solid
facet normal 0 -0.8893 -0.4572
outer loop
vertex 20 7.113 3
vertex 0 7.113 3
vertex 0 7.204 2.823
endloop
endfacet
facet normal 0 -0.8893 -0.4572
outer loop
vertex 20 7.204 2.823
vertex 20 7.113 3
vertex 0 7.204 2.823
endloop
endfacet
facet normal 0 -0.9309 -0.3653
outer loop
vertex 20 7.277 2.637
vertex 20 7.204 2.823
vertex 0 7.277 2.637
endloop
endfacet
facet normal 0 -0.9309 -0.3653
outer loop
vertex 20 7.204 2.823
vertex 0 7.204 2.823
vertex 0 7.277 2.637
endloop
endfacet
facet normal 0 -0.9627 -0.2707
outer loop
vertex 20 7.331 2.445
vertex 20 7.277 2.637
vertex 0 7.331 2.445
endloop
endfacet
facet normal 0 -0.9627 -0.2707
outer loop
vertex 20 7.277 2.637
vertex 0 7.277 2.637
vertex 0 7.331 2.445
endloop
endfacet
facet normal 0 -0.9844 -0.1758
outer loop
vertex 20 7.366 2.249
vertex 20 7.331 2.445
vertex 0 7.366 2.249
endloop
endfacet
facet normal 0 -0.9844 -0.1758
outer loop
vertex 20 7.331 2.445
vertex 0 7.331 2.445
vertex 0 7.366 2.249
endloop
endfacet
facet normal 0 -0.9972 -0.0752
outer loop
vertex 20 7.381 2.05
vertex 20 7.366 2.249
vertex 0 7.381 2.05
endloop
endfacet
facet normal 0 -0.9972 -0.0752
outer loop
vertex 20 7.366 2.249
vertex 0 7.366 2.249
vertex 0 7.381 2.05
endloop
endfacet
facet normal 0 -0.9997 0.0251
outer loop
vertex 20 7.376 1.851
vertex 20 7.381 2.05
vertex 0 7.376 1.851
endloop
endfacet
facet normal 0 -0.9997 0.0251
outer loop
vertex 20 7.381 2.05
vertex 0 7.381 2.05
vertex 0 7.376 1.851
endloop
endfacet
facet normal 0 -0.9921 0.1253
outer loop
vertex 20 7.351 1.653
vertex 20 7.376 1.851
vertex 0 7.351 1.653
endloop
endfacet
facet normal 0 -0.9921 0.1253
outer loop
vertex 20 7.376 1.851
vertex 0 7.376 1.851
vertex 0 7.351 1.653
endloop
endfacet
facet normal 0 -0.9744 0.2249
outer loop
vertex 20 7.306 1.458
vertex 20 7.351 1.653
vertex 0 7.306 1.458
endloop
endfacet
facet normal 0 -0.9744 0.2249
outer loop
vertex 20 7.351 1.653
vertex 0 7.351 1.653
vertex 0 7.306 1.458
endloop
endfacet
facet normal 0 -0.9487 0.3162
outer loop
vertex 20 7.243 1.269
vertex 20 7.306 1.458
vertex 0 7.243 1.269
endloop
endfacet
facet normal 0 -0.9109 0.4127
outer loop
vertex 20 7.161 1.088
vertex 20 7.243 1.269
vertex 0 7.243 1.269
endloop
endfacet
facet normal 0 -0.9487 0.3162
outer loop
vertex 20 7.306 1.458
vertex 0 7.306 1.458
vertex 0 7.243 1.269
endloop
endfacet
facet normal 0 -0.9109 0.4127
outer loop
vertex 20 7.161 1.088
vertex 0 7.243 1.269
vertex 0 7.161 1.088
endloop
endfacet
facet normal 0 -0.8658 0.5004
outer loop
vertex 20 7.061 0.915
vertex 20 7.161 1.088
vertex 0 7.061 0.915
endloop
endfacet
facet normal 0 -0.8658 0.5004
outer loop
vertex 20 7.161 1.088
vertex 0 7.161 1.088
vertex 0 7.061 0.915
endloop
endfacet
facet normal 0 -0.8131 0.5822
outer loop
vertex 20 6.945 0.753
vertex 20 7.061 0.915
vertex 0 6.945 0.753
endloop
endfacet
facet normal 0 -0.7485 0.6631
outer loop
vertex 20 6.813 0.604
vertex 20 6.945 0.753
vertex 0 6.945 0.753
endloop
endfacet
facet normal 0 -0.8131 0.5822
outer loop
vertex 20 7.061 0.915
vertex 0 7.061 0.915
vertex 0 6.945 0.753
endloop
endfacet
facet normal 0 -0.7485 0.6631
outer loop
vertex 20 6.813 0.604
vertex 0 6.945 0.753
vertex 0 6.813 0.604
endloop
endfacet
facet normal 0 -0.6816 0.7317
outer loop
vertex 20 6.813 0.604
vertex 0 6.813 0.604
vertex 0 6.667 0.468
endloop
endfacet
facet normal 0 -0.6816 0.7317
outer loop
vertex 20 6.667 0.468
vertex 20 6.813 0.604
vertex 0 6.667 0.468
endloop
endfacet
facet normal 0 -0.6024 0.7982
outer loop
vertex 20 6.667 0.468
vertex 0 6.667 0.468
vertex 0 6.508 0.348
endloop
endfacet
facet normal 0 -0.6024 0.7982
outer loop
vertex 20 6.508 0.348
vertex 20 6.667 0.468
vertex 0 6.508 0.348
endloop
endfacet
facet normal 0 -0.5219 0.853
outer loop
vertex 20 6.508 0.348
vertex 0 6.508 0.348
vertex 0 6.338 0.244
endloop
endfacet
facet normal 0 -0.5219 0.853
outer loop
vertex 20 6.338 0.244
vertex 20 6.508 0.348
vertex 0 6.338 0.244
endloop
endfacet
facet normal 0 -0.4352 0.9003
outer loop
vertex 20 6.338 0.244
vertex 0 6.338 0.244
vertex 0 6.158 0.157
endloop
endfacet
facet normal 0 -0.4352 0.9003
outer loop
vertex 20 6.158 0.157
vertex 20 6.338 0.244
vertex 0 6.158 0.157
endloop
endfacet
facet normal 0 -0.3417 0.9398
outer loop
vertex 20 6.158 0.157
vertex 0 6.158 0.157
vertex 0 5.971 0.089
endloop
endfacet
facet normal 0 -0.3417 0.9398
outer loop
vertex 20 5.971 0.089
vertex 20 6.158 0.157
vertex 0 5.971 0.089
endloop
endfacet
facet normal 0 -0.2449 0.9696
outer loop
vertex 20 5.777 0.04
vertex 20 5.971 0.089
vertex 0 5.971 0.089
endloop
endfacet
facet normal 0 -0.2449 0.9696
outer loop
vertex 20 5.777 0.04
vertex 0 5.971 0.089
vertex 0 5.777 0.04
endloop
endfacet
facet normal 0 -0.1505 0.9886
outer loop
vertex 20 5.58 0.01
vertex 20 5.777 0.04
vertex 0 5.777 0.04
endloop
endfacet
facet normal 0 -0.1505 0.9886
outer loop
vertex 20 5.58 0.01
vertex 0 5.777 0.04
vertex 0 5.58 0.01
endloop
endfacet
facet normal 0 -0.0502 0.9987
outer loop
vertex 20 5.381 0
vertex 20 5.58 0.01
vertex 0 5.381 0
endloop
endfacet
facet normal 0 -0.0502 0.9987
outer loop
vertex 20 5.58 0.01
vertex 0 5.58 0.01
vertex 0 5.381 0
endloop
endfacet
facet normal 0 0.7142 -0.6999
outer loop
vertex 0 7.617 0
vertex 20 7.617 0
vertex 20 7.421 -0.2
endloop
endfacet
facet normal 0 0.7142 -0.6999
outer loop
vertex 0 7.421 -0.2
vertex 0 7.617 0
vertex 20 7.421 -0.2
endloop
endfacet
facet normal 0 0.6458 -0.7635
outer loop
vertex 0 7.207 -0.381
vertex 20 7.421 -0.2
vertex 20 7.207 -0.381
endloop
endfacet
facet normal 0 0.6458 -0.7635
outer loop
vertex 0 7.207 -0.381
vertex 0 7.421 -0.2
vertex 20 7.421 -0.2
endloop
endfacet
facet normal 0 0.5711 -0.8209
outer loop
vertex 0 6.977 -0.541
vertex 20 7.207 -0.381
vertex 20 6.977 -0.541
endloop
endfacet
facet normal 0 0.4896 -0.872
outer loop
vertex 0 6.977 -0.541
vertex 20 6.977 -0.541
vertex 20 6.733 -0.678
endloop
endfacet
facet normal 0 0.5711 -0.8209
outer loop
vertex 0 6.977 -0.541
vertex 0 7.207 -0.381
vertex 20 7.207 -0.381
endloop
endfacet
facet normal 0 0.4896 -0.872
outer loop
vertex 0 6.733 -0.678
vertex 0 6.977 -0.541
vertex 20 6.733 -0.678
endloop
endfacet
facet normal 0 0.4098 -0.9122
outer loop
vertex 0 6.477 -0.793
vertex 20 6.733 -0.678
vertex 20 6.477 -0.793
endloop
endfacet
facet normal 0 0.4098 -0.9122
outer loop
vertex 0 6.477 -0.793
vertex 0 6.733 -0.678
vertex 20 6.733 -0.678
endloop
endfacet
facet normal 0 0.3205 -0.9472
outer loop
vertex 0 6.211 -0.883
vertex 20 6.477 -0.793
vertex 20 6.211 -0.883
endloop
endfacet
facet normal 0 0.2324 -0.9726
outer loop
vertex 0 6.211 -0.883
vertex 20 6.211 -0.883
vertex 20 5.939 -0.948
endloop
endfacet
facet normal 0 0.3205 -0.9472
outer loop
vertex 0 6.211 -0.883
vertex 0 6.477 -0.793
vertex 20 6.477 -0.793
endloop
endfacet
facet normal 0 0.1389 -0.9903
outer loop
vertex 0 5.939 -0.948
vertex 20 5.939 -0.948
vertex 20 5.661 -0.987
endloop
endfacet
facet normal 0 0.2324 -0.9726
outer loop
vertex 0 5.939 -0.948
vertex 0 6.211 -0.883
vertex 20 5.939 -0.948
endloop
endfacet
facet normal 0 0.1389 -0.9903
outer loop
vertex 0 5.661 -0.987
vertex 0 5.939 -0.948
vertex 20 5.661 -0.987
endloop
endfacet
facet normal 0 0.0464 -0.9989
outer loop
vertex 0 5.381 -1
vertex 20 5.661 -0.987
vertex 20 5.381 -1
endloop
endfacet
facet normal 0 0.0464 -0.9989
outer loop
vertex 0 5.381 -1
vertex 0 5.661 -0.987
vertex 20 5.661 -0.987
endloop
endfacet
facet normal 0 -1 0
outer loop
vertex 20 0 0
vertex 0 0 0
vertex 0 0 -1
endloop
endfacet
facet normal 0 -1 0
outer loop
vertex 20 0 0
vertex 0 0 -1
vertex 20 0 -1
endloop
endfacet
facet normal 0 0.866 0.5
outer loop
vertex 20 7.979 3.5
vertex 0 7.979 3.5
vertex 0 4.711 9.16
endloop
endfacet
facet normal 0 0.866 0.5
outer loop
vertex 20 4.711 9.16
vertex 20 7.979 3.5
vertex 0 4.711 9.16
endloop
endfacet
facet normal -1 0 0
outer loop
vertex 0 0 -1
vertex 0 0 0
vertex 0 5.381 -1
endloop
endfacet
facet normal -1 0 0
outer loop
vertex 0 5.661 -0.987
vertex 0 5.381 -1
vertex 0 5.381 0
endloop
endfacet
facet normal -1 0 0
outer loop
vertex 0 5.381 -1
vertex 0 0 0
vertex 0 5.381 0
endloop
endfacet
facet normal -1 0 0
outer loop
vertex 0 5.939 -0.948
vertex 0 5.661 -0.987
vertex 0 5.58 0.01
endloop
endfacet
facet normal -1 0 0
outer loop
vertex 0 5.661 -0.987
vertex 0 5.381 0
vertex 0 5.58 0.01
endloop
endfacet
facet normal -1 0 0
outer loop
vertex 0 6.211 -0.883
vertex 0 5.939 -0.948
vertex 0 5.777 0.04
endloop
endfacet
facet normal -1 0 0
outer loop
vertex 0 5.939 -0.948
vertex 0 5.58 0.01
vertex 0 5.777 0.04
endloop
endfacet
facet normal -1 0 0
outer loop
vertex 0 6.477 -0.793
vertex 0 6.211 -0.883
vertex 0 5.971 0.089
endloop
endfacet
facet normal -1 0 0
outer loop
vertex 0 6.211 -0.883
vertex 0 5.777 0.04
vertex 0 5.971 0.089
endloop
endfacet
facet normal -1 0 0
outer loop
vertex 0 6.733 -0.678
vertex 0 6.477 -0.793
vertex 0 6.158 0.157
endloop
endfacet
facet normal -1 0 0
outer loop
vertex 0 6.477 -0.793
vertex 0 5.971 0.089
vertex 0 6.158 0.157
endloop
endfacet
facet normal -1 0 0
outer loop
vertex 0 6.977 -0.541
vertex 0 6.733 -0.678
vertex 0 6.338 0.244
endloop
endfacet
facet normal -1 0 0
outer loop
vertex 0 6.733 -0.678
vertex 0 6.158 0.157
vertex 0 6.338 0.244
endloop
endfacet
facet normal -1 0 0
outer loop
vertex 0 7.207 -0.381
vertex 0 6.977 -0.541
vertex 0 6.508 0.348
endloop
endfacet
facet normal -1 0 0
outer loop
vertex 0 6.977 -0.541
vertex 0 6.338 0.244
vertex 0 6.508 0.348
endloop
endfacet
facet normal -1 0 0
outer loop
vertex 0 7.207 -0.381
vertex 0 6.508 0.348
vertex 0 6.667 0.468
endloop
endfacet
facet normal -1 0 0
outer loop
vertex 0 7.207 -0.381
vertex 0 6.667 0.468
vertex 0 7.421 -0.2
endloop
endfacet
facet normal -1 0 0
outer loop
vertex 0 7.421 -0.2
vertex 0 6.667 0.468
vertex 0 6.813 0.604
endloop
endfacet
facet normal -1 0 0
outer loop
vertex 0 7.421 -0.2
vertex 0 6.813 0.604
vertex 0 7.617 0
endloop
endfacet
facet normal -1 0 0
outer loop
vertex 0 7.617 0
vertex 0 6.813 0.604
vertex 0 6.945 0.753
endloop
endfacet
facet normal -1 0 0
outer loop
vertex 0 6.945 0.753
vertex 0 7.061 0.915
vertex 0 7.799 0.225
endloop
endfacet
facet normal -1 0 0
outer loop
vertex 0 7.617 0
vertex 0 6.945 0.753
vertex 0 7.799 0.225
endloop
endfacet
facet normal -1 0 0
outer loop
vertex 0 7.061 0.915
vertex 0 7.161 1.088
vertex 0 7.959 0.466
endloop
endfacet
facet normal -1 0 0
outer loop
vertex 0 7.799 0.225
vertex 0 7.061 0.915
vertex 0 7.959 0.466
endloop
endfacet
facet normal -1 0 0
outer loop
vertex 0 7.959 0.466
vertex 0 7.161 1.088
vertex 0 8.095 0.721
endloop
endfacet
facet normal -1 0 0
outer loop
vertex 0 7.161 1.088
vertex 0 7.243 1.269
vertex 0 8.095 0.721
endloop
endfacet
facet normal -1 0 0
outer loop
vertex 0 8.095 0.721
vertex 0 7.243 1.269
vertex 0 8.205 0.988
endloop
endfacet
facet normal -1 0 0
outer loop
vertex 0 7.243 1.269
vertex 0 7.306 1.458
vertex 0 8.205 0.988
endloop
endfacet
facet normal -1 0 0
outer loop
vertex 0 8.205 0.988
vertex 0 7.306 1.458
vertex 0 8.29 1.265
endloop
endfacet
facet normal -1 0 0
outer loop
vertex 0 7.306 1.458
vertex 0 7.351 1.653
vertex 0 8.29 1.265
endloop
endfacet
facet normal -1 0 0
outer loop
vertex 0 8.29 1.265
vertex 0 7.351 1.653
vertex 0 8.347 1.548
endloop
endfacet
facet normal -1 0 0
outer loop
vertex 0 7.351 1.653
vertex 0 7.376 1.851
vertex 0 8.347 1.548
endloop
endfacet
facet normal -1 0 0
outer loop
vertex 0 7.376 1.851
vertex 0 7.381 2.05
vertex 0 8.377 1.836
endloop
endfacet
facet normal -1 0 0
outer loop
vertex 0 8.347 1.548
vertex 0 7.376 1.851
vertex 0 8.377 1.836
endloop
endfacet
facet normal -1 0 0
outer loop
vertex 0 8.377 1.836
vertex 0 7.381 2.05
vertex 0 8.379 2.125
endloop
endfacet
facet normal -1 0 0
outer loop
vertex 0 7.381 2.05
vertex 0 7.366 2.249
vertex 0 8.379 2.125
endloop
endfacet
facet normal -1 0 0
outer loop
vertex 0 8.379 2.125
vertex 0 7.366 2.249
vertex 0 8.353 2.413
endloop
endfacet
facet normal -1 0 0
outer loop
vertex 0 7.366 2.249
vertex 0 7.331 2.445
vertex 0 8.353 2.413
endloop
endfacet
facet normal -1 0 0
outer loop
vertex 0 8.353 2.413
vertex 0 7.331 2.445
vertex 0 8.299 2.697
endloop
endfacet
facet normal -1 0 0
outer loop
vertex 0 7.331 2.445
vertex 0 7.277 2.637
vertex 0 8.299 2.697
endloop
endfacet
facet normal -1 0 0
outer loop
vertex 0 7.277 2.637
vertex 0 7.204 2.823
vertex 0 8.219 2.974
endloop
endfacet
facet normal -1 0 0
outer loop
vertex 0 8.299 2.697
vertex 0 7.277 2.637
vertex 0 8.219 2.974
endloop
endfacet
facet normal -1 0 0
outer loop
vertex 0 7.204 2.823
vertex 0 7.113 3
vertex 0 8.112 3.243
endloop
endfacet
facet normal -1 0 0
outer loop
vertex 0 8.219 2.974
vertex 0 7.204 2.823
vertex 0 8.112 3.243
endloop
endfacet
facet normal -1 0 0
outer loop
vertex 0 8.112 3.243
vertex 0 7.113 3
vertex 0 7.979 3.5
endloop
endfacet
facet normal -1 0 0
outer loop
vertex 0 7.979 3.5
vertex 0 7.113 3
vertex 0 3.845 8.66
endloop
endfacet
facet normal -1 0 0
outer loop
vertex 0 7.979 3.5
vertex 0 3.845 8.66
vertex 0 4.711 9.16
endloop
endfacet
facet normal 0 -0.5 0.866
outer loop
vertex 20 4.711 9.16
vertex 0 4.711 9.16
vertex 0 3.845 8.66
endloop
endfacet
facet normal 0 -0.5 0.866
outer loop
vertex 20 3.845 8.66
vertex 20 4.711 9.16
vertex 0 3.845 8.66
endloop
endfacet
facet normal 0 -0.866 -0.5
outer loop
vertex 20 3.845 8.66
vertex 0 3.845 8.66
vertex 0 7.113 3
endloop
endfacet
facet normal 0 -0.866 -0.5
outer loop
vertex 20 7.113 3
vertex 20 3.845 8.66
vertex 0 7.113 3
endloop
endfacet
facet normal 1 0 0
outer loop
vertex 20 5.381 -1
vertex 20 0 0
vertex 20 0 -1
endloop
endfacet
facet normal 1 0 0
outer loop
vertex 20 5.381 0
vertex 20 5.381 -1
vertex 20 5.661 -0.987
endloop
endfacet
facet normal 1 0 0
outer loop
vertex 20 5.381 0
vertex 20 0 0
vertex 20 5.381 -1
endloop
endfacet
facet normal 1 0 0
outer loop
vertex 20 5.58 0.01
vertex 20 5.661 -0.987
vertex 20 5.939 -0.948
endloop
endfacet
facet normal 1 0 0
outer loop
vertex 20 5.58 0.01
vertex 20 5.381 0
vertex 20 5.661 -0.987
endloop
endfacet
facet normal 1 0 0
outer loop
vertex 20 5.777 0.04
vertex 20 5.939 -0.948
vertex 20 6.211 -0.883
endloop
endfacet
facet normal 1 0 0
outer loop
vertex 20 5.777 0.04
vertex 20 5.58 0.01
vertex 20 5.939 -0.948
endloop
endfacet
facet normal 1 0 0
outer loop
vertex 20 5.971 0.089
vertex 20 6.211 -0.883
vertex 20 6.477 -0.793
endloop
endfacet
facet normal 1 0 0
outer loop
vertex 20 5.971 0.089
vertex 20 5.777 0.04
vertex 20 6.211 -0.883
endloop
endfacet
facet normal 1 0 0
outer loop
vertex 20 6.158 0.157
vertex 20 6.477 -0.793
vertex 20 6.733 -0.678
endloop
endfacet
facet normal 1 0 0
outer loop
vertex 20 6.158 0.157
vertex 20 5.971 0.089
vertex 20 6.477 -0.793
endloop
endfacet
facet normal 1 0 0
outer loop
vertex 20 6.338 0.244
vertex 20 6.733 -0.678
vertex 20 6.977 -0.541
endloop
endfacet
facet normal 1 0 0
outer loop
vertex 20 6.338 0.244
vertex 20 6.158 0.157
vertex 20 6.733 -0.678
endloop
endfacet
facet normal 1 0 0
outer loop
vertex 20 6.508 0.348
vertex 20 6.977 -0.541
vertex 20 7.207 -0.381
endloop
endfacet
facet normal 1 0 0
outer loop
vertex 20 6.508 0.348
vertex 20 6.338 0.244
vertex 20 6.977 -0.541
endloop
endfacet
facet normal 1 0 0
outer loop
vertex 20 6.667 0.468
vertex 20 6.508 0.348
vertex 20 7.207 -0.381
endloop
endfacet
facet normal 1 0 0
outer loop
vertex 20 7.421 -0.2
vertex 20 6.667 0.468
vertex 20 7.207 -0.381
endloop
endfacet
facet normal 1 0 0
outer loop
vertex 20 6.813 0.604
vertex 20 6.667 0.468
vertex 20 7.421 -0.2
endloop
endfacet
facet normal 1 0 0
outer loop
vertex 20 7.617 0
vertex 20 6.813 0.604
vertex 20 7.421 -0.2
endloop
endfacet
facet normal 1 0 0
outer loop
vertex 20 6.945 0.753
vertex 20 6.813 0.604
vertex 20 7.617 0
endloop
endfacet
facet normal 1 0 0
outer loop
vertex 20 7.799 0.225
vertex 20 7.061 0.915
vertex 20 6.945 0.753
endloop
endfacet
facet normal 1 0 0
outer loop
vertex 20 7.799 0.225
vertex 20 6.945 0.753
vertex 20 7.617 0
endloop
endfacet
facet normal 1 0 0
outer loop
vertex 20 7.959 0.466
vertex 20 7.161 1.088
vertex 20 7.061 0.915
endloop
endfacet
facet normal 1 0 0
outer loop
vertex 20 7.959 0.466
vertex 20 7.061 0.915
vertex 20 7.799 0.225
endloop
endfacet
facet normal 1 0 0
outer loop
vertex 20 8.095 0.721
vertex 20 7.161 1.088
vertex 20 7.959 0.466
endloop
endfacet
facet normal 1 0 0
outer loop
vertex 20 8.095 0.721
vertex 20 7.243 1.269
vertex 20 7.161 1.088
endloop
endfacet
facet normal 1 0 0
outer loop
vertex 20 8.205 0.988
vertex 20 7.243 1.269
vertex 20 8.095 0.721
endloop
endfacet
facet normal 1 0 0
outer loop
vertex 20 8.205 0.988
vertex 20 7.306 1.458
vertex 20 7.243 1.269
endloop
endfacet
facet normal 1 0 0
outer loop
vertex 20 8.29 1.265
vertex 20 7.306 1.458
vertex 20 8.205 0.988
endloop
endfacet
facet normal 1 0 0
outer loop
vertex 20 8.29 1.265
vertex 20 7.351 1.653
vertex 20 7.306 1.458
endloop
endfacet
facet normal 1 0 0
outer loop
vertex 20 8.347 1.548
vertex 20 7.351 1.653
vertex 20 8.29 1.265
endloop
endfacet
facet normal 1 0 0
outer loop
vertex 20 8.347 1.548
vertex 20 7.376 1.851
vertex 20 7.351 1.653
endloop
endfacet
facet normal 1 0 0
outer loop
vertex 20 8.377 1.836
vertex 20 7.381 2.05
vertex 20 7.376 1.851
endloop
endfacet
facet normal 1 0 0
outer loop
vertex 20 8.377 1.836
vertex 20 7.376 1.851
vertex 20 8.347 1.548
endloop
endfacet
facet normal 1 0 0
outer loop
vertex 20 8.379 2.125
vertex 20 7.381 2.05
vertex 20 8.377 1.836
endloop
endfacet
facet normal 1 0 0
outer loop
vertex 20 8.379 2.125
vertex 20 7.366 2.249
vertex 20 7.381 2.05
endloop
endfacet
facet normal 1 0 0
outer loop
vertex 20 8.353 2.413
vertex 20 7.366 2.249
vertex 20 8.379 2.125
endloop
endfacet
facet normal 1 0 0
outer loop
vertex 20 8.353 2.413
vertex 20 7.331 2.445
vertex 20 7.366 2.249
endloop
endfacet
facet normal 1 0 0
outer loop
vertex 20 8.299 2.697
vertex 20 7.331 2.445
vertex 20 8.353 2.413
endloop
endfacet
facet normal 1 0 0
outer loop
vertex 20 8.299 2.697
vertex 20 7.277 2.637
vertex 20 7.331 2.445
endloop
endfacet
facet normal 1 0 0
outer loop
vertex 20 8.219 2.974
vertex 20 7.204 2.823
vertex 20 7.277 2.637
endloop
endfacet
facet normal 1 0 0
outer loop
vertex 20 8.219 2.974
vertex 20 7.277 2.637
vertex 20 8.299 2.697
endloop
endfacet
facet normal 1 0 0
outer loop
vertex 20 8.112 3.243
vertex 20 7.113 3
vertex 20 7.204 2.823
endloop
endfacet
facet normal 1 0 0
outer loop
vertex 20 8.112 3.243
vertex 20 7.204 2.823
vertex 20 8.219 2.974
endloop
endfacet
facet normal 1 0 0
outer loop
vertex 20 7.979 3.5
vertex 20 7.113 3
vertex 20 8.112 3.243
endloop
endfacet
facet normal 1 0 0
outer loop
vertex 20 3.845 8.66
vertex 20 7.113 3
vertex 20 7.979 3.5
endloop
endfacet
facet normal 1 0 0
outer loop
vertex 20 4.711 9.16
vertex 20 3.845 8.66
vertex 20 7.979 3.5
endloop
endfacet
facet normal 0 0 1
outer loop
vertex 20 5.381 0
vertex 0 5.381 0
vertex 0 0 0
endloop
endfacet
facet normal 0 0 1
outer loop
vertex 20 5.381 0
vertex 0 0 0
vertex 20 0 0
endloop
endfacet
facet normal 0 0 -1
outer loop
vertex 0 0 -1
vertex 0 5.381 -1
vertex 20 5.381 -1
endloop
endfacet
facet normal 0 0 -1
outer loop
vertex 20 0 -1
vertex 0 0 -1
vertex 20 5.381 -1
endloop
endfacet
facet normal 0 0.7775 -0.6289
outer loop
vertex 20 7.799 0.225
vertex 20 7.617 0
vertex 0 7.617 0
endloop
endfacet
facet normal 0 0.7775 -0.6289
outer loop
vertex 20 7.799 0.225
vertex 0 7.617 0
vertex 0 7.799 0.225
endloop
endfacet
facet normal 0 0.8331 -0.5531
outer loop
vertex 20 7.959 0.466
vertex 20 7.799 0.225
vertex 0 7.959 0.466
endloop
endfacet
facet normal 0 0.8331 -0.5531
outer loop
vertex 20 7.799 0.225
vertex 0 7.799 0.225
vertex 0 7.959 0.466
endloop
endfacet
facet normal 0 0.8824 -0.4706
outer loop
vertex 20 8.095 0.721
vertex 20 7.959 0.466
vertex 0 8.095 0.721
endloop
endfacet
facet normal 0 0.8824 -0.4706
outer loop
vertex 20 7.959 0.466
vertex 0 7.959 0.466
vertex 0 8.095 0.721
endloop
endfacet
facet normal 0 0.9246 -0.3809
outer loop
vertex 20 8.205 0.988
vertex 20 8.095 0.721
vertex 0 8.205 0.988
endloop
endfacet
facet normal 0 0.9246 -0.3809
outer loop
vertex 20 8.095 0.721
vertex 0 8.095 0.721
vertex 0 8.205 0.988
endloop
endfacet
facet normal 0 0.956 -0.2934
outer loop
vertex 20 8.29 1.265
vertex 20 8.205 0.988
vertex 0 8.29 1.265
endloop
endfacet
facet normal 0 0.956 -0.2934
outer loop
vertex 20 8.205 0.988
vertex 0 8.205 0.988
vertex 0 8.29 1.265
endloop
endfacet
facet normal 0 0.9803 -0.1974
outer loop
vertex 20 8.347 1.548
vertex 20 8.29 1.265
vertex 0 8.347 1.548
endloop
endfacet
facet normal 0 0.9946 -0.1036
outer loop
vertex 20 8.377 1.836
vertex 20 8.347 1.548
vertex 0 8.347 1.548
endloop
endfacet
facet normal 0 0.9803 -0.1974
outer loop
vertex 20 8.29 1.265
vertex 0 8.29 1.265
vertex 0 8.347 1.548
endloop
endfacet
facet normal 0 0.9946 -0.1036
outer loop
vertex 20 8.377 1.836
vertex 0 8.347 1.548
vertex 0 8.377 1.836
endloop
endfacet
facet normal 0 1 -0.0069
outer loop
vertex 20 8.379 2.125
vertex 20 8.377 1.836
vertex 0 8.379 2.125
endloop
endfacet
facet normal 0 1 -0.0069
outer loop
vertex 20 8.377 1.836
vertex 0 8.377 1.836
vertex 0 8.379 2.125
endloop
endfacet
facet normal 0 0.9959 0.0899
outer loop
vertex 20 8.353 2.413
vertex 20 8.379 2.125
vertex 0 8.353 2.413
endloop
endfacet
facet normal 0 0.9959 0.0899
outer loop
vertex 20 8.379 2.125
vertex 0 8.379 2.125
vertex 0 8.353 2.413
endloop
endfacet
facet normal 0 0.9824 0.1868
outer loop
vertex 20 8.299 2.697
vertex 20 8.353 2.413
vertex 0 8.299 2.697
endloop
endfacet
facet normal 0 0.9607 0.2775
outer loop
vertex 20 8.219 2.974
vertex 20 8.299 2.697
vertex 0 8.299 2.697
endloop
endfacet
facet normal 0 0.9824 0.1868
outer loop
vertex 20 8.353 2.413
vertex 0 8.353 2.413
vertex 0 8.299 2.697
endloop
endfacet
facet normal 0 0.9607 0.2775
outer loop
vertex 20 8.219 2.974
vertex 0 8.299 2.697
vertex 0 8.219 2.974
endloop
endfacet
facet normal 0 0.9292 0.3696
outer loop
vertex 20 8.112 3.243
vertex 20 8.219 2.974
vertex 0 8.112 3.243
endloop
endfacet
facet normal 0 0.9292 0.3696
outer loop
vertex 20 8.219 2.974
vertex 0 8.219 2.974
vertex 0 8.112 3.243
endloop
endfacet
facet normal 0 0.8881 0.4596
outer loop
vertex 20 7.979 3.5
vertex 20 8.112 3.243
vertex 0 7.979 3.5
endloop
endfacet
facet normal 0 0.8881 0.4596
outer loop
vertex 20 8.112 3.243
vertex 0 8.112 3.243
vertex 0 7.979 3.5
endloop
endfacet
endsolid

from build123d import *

# Parameters (mm, degrees)
SKETCH_1_W         = 20
SKETCH_1_H         = 10
BASEPLATE_DEPTH    = 1
EDGEFLANGE_DEPTH   = 20
EDGEFLANGE_2_DEPTH = 20


# Read off the part's stored shape, not the designer's step: EdgeFlange
# Sheet-metal steps are written as plain solids
with BuildPart() as part:
    # Sketch 1 → BasePlate (new body)
    with BuildSketch(Plane.XY):
        with Locations((10, 5)):
            Rectangle(SKETCH_1_W, SKETCH_1_H)
    extrude(amount=-BASEPLATE_DEPTH)

    # EdgeFlange outline → EdgeFlange (cut)
    with BuildSketch(Plane.YZ):
        with BuildLine():
            Line((10, 0), (7.617265824, 0))
            ThreePointArc((7.617265824, 0), (6.605942718, -0.738612788), (5.381197846, -1))
            Line((5.381197846, -1), (10, -1))
            Line((10, -1), (10, 0))
        make_face()
    extrude(amount=EDGEFLANGE_DEPTH, mode=Mode.SUBTRACT)

    # EdgeFlange 2 outline → EdgeFlange 2 (add)
    with BuildSketch(Plane.YZ):
        with BuildLine():
            ThreePointArc((7.617265824, 0), (8.365278527, 1.691353778), (7.979274058, 3.5))
            Line((7.979274058, 3.5), (4.711324865, 9.160254038))
            Line((4.711324865, 9.160254038), (3.845299462, 8.660254038))
            Line((3.845299462, 8.660254038), (7.113248654, 3))
            ThreePointArc((7.113248654, 3), (7.113248654, 1), (5.381197846, 0))
            Line((5.381197846, 0), (7.617265824, 0))
        make_face()
    extrude(amount=EDGEFLANGE_2_DEPTH)


solid = part.part
